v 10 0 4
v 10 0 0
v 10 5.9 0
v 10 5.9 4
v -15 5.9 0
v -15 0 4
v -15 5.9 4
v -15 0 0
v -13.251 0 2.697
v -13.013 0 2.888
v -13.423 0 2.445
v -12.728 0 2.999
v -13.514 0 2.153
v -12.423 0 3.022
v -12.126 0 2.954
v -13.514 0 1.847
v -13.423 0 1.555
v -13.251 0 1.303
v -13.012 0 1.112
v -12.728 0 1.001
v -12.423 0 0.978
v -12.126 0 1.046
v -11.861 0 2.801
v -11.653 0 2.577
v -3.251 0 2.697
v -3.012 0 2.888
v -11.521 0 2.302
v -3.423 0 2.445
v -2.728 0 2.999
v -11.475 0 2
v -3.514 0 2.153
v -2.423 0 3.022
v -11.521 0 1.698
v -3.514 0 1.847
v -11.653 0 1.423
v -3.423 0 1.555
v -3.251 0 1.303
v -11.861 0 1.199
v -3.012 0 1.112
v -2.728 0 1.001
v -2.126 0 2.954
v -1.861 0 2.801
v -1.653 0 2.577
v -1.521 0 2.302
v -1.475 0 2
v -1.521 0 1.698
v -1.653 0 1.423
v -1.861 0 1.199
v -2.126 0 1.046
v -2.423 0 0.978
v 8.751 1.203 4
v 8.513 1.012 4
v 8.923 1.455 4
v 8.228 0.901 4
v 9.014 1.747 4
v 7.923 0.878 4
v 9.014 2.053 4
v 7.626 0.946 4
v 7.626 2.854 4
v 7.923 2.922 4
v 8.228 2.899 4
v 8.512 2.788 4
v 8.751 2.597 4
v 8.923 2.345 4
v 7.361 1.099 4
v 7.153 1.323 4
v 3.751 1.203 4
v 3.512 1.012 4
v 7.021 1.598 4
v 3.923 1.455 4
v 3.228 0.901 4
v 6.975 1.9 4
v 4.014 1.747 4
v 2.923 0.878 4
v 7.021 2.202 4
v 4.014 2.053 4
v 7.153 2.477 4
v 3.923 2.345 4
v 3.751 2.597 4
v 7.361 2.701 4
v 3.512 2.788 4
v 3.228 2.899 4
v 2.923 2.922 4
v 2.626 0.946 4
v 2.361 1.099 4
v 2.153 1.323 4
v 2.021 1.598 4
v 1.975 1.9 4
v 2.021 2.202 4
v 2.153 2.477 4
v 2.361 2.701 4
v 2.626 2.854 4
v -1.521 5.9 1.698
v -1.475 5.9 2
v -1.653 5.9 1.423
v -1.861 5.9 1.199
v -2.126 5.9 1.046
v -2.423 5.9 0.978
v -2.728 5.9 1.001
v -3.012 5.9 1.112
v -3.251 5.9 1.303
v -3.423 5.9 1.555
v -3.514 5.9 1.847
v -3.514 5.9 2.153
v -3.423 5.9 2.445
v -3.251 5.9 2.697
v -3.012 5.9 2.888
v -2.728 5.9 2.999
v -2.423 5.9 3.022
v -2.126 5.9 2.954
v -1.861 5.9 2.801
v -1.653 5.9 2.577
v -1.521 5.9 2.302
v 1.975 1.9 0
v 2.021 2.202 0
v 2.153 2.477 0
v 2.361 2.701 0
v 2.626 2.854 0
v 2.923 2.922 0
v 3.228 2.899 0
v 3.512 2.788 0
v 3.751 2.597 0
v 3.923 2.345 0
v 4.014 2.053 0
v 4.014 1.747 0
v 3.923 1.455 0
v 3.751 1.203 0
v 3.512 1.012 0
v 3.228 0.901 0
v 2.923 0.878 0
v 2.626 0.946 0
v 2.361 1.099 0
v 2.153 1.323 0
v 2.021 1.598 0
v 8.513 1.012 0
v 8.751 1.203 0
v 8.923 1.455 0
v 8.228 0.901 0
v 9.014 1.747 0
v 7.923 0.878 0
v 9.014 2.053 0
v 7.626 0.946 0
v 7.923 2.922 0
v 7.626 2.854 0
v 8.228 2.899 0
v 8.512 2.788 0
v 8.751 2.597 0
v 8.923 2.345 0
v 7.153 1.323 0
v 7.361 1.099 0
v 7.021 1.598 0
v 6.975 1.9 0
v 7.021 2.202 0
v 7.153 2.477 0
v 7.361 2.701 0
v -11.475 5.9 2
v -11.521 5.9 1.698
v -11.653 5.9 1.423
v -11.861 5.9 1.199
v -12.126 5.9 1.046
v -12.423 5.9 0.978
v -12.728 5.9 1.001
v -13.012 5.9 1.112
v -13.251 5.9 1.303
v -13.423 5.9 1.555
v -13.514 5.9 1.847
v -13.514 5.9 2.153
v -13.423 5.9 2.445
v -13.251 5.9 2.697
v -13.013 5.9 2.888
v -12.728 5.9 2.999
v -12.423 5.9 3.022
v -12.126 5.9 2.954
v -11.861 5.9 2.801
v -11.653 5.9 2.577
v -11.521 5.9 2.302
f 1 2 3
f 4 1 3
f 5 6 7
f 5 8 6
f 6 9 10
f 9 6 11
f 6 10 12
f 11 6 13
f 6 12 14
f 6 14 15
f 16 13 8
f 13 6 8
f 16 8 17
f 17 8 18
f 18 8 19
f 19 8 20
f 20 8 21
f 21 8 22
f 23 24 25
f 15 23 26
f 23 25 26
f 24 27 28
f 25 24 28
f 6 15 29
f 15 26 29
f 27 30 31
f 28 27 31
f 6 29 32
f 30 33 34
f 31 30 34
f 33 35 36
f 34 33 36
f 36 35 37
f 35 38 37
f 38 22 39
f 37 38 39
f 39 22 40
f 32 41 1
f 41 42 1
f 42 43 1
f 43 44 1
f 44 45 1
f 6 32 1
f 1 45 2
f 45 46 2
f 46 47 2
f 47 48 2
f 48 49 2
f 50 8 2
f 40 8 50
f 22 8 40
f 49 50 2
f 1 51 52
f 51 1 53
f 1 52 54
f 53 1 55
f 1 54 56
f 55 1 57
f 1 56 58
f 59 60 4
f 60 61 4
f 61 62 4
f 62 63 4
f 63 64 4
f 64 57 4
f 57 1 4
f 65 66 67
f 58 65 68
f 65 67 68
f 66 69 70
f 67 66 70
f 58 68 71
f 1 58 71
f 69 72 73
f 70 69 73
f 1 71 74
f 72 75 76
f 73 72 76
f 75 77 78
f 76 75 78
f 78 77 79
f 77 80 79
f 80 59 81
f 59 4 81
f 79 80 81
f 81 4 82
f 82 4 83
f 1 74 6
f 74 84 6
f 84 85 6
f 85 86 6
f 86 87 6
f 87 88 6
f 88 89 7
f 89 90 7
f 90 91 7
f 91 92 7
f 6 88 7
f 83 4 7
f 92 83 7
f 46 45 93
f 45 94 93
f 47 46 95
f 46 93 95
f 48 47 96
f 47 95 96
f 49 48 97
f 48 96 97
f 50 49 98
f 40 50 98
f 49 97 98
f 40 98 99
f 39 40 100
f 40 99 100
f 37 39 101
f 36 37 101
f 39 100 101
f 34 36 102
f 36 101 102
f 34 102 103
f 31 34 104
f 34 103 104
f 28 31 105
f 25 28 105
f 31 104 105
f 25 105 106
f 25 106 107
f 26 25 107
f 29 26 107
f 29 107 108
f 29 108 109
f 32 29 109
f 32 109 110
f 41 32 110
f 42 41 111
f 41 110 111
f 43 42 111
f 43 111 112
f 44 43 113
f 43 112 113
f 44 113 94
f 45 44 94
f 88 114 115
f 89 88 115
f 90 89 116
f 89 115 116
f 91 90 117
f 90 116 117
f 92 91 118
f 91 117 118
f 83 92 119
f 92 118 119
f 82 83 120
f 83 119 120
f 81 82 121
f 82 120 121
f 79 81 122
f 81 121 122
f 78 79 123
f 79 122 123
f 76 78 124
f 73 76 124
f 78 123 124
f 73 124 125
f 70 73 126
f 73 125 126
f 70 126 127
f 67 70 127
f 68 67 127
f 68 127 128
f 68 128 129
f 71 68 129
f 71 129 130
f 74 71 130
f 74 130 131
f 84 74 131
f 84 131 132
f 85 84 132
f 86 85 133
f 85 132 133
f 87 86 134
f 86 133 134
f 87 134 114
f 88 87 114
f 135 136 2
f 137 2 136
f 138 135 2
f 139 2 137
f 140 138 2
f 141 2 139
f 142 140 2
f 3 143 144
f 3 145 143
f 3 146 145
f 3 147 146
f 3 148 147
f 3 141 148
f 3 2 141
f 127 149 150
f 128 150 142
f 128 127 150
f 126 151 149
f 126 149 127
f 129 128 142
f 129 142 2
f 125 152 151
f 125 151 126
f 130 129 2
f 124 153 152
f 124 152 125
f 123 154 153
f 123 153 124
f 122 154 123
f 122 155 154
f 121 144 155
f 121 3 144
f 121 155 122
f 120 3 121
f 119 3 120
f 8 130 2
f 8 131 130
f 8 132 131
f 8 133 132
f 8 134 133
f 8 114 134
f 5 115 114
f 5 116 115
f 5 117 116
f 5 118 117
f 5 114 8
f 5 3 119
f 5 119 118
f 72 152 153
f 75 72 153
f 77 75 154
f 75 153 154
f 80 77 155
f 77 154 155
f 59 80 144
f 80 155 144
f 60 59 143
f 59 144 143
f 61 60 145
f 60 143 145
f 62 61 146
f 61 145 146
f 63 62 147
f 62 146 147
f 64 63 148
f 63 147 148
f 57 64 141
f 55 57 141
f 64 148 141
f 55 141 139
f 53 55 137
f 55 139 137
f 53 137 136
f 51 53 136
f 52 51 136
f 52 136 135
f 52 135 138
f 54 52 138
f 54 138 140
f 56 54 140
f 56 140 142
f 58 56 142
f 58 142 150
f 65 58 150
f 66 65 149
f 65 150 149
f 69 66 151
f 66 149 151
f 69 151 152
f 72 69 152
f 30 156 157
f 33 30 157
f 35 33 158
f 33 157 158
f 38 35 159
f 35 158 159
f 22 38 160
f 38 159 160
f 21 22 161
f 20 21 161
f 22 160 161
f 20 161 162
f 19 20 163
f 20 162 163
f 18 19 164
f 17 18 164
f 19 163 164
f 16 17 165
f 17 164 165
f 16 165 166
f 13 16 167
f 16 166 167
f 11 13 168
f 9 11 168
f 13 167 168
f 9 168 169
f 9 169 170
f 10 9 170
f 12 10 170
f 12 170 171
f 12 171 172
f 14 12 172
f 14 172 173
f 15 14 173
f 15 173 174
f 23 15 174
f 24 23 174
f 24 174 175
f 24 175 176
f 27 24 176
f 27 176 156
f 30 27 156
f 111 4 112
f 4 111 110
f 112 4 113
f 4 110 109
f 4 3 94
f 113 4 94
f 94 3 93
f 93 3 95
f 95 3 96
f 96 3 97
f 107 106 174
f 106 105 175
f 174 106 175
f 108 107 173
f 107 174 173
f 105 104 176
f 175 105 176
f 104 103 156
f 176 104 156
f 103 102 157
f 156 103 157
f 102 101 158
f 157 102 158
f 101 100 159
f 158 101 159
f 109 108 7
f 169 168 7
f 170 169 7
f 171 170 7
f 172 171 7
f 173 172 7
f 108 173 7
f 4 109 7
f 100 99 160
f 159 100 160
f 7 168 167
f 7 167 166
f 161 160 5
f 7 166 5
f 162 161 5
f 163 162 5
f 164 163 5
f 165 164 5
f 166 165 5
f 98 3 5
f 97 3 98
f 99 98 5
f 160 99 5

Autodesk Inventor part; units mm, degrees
ref_plane "YZ Plane" through (0, 0, 0) normal (1, 0, 0) x (0, 1, 0)
ref_plane "XZ Plane" through (0, 0, 0) normal (0, 1, 0) x (-1, 0, 0)
ref_plane "XY Plane" through (0, 0, 0) normal (0, 0, 1) x (1, 0, 0)
sketch "Sketch1" plane through (0, 0, 0) normal (0, 0, 1) x (1, 0, 0)
  line L0 (0, 0) -> (-15, 0)
  line L1 (-15, 0) -> (-15, 5.9)
  line L2 (-15, 5.9) -> (0, 5.9)
  line L3 (0, 5.9) -> (0, 0)
  dimension "d0" = 5.9
  dimension "d1" = 15
extrude "Extrusion1" add sketch "Sketch1" along normal blind 4
sketch "Sketch2" plane through (-15, 5.9, 0) normal (0, 1, 0) x (1, 0, 0)
  circle A0 centre (12.5, -2) radius 1.025
  circle A1 centre (2.5, -2) radius 1.025
  line L0 (15, 0) -> (15, -4) projected
  line L1 (15, -4) -> (0, -4) projected
  dimension "d4" = 10
  dimension "d5" = 2.5
  dimension "d6" = 2
  dimension "d7" = 2
  dimension "d8" = 2.05
  dimension "d9" = 2.05
extrude "Extrusion2" cut sketch "Sketch2" against normal blind 8
sketch "Sketch3" plane through (0, 0, 0) normal (0, 0, -1) x (-1, 0, 0)
  line L0 (0, 0) -> (0, 5.9) projected
  line L1 (0, 0) -> (-10, 0)
  line L2 (-10, 0) -> (-10, 5.9)
  line L3 (-10, 5.9) -> (0, 5.9)
  line L4 (0, 5.9) -> (0, 0)
  dimension "d12" = 10
extrude "Extrusion3" add sketch "Sketch3" against normal blind 4
sketch "Sketch4" plane through (0, 0, 0) normal (0, 0, -1) x (-1, 0, 0)
  line L0 (3.525, 5.9) -> (3.525, 0) projected
  line L1 (1.475, 5.9) -> (1.475, 0) projected
  circle A0 centre (-3, 1.9) radius 1.025
  circle A1 centre (-8, 1.9) radius 1.025
  line L2 (-10, 5.9) -> (15, 5.9) projected
  line L3 (15, 0) -> (-10, 0) projected
  line L4 (-10, 5.9) -> (-10, 0) projected
  point P0 (0, 0)
  dimension "d15" = 2.05
  dimension "d16" = 5.9
  dimension "d17" = 4
  dimension "d18" = 4
  dimension "d19" = 5
  dimension "d20" = 2
  dimension "d21" = 2.05
  dimension "d22" = 2.05
extrude "Extrusion4" cut sketch "Sketch4" against normal blind 4 contours A0 | A1
equation "\"d7\" = d6"
equation "\"d18\" = d17"
equation "\"d21\" = d15"
equation "\"d22\" = d15"
properties part number "AngleScrewBlocActuator" material "Stainless Steel"
